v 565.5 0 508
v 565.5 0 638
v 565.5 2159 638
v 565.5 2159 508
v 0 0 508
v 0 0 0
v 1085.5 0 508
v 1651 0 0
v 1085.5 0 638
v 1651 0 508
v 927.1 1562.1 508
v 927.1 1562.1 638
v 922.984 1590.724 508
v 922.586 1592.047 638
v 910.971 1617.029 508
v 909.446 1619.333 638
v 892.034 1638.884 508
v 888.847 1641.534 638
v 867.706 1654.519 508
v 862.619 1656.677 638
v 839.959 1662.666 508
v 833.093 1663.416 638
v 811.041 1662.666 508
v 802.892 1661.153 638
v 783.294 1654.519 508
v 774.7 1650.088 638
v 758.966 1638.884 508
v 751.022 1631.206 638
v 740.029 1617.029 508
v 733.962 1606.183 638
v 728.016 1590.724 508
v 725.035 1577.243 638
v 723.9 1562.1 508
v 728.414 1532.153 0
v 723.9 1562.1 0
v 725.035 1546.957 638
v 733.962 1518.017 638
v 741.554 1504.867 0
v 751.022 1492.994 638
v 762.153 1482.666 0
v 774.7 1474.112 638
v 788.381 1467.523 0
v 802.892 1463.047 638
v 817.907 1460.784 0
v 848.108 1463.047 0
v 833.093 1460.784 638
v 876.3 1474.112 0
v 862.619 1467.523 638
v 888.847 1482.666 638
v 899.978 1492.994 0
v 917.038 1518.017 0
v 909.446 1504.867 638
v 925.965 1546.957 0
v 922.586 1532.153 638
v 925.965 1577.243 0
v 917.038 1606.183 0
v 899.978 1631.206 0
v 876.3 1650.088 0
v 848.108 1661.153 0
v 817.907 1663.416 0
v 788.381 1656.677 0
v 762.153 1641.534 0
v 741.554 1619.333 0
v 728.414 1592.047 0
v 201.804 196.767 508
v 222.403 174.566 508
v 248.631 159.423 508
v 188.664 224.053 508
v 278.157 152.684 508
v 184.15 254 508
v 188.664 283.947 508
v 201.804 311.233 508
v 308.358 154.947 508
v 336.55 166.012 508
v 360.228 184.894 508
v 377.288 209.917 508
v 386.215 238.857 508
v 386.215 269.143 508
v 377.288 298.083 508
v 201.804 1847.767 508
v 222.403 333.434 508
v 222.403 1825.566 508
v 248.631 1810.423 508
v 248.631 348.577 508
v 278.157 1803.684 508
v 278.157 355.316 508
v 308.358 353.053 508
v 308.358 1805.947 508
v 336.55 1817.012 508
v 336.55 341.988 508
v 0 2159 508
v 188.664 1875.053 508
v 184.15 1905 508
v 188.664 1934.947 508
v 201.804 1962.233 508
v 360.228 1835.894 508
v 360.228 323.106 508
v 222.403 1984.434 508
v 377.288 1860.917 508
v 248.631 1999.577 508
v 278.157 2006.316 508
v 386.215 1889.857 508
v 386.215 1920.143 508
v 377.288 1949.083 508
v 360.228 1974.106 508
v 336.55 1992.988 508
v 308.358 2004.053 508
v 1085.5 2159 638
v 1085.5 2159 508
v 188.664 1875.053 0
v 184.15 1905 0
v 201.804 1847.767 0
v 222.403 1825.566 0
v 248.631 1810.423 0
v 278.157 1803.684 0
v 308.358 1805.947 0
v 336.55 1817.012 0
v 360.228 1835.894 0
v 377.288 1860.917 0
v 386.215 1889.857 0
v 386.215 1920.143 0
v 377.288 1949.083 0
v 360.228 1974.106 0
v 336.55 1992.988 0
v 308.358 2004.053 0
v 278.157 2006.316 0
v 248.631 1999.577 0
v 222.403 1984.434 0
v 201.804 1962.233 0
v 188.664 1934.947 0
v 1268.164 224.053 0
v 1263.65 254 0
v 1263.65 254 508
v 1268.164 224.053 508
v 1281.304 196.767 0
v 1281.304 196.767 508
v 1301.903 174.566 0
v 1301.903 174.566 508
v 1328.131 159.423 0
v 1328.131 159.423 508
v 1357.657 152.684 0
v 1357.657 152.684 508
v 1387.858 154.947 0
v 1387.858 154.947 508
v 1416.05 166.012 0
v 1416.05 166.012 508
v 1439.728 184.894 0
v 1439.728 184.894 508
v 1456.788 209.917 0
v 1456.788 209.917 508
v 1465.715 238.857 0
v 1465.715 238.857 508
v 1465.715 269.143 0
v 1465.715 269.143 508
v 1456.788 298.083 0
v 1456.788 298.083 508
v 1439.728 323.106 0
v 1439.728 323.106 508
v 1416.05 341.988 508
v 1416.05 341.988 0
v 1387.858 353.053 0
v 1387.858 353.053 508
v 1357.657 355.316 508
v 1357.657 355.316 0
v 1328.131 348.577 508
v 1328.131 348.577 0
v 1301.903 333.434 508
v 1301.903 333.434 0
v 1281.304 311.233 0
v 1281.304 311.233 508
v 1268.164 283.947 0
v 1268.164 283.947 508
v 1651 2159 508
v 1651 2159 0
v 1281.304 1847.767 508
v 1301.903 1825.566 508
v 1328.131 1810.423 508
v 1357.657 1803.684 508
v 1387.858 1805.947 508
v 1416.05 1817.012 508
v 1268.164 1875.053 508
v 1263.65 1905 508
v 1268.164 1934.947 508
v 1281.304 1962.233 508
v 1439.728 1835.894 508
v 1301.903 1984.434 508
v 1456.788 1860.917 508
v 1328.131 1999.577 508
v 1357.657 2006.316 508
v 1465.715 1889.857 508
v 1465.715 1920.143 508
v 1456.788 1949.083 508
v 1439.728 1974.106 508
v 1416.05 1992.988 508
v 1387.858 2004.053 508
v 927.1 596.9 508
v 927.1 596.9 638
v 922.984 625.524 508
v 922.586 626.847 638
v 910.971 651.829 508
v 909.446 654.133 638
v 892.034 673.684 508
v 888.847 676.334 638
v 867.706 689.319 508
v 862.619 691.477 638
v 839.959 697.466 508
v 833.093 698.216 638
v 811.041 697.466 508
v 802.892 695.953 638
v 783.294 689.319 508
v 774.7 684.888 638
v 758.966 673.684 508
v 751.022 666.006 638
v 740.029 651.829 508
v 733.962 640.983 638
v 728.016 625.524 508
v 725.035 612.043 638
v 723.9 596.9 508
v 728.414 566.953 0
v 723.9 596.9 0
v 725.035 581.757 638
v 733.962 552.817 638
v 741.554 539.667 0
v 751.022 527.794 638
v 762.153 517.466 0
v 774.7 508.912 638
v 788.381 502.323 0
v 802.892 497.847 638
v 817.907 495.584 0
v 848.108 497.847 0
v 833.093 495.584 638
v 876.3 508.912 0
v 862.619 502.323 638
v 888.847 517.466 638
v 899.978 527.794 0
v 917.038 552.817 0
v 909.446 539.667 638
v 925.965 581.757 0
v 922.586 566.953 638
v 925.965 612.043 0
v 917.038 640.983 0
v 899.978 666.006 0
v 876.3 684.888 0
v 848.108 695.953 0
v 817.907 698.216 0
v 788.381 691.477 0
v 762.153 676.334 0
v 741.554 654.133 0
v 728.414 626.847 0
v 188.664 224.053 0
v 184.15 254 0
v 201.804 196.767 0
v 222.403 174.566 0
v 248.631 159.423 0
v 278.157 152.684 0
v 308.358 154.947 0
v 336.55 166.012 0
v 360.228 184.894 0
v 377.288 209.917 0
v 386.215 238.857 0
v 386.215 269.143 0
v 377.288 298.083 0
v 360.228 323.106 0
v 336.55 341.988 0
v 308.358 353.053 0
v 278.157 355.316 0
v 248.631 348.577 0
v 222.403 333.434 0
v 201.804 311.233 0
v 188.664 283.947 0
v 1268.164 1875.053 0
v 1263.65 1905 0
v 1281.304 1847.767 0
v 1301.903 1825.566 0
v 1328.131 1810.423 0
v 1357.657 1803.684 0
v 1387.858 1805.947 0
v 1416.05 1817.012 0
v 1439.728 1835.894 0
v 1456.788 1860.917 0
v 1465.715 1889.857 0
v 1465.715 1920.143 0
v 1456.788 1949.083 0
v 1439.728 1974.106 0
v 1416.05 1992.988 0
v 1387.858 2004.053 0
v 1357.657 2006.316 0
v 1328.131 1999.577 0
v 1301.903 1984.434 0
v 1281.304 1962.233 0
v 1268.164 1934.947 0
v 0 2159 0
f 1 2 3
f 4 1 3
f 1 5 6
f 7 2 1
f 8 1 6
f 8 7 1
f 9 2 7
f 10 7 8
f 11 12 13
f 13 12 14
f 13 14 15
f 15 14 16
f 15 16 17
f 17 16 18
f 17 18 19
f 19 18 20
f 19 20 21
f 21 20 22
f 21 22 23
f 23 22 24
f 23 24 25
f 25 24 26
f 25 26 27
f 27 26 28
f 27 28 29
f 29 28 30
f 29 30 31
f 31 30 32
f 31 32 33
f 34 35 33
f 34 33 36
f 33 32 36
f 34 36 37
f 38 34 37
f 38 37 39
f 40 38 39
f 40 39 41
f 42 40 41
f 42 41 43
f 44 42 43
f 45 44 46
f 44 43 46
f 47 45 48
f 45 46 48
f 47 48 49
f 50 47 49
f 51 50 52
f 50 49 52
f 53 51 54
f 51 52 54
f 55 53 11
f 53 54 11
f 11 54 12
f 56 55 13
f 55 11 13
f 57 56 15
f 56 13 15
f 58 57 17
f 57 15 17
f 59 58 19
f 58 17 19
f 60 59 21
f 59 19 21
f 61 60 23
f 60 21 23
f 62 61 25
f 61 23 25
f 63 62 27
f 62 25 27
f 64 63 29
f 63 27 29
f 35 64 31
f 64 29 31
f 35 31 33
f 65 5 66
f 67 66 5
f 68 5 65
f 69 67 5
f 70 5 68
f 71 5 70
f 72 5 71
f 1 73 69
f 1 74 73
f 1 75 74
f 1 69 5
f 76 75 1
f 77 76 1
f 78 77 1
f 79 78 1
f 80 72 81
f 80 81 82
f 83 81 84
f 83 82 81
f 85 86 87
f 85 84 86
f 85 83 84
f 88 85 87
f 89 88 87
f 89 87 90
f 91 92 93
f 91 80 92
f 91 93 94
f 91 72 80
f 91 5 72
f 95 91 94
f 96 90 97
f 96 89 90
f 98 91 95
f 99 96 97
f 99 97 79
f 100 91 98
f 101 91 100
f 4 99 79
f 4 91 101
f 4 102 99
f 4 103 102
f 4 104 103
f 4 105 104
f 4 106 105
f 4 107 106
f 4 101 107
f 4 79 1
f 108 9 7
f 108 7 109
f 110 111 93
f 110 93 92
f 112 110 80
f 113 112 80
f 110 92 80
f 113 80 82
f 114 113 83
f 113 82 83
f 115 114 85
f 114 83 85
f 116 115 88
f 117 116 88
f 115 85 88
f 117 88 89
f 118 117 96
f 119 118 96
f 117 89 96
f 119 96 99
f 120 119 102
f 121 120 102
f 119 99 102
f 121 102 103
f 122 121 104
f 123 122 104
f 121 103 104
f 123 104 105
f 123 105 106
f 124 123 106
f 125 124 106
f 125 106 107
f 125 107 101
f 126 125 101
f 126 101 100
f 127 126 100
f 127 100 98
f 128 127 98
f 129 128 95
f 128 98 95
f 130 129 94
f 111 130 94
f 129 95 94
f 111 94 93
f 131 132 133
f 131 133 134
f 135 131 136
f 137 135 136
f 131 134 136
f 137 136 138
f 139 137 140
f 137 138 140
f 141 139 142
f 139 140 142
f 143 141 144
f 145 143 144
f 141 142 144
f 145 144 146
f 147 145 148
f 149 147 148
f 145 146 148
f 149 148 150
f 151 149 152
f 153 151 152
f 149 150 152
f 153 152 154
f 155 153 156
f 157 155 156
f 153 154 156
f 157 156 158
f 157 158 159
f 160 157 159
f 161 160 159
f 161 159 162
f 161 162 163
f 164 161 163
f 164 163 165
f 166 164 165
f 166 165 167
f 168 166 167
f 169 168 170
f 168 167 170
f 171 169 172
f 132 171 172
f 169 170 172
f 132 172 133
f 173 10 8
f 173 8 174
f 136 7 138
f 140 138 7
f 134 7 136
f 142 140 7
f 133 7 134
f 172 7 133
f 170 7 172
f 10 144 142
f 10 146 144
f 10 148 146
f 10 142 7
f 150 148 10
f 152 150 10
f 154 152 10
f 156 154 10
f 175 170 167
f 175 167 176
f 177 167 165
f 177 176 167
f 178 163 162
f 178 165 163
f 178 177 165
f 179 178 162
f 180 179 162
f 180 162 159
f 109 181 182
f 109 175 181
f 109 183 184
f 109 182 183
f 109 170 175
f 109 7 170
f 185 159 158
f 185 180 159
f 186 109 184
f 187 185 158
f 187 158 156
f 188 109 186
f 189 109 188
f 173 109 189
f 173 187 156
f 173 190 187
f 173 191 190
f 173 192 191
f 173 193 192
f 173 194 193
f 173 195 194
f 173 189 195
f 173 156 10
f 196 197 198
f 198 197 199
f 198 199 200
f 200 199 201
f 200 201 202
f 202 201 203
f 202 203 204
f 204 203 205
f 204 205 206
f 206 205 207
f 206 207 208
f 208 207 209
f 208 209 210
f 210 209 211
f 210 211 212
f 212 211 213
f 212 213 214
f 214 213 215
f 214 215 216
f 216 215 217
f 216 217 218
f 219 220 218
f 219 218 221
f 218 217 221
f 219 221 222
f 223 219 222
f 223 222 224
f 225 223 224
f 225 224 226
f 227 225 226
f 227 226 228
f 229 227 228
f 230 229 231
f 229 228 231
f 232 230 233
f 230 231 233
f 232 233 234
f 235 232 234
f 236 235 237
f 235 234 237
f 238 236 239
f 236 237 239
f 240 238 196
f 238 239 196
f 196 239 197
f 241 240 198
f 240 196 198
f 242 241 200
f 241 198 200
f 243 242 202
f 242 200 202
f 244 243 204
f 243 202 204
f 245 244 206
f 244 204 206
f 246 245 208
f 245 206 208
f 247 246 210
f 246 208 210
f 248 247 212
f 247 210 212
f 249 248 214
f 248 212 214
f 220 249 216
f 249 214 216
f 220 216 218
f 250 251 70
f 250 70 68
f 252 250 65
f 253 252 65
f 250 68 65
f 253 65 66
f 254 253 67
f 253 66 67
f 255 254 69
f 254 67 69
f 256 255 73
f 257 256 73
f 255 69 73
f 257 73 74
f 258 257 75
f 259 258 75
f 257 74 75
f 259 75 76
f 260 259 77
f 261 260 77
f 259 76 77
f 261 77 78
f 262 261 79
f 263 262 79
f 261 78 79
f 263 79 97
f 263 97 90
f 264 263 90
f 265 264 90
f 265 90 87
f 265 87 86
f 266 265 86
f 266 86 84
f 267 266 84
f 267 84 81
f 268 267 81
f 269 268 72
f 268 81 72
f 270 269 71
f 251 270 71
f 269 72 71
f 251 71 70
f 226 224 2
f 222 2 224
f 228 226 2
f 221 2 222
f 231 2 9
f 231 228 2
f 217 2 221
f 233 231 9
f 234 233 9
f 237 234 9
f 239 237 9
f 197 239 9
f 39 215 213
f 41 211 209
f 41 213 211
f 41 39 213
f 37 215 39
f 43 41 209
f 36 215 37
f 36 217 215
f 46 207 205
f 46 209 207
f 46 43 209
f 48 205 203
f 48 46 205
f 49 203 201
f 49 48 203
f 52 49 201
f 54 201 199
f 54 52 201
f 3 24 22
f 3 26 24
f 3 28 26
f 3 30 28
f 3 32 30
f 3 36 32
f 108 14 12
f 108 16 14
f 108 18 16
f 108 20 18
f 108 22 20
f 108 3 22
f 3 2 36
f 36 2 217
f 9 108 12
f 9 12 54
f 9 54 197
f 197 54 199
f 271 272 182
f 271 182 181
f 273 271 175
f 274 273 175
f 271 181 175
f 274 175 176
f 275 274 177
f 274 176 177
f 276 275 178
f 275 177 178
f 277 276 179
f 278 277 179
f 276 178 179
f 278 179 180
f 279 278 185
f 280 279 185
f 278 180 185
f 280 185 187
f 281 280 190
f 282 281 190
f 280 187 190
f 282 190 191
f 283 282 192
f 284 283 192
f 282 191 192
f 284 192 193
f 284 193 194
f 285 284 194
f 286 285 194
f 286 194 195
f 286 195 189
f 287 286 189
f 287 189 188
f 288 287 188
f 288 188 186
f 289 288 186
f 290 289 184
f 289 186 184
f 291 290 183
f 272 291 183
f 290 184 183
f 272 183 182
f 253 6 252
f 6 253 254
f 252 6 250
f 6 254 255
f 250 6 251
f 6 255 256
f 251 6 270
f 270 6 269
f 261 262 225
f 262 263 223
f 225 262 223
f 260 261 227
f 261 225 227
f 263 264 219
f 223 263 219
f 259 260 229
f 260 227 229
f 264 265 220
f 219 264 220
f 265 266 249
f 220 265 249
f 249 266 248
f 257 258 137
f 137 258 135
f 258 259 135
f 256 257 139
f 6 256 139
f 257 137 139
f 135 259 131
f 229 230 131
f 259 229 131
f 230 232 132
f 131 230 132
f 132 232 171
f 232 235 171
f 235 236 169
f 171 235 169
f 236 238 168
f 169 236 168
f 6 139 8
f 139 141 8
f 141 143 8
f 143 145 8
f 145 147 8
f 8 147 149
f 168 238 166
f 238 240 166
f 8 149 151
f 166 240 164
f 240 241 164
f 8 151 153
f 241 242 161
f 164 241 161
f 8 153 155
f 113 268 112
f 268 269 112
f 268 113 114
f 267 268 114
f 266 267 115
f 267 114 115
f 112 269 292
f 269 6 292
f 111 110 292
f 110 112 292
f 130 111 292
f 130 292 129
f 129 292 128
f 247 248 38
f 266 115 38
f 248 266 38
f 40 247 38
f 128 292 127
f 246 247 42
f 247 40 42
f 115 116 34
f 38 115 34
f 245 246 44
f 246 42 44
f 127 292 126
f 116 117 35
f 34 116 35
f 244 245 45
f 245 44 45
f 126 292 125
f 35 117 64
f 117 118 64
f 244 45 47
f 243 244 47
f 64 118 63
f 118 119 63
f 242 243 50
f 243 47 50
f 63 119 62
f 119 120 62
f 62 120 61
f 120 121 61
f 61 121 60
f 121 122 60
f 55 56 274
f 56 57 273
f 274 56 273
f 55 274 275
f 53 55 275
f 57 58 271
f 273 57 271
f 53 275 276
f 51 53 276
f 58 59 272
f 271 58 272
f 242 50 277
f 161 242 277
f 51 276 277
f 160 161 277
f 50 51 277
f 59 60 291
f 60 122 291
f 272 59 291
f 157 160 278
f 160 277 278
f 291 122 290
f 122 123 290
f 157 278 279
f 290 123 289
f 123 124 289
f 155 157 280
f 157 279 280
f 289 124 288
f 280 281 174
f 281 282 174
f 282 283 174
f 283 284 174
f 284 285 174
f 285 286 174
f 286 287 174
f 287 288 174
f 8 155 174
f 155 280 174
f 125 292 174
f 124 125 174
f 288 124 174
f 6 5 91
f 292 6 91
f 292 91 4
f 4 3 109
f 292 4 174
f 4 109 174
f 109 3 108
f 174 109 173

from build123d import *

# Parameters (mm, degrees)
SKETCH1_W           = 1651
SKETCH1_H           = 2159
SKETCH1_R           = 101.6
BOSS_EXTRUDE1_DEPTH = 508
BOSS_EXTRUDE2_START = 130
SKETCH2_W           = 520
SKETCH2_H           = 2159
SKETCH2_R           = 101.6
BOSS_EXTRUDE2_DEPTH = 130


with BuildPart() as part:
    # Sketch1 → Boss-Extrude1 (new body)
    with BuildSketch(Plane.XY.offset(508)):
        with Locations((825.5, 1079.5)):
            Rectangle(SKETCH1_W, SKETCH1_H)
        with Locations(Location((285.75, 254, 0), (0, 0, 180))):
            Circle(SKETCH1_R, mode=Mode.SUBTRACT)
        with Locations(Location((1365.25, 1905, 0), (0, 0, 180))):
            Circle(SKETCH1_R, mode=Mode.SUBTRACT)
        with Locations(Location((825.5, 1562.1, 0), (0, 0, 180))):
            Circle(SKETCH1_R, mode=Mode.SUBTRACT)
        with Locations(Location((285.75, 1905, 0), (0, 0, 180))):
            Circle(SKETCH1_R, mode=Mode.SUBTRACT)
        with Locations(Location((1365.25, 254, 0), (0, 0, 180))):
            Circle(SKETCH1_R, mode=Mode.SUBTRACT)
        with Locations(Location((825.5, 596.9, 0), (0, 0, 180))):
            Circle(SKETCH1_R, mode=Mode.SUBTRACT)
    extrude(amount=-BOSS_EXTRUDE1_DEPTH)

    # Sketch2 → Boss-Extrude2 (add)
    with BuildSketch(Plane.XY.offset(508).offset(BOSS_EXTRUDE2_START)):
        with Locations((825.5, 1079.5)):
            Rectangle(SKETCH2_W, SKETCH2_H)
        with Locations((825.5, 596.9)):
            Circle(SKETCH2_R, mode=Mode.SUBTRACT)
        with Locations((825.5, 1562.1)):
            Circle(SKETCH2_R, mode=Mode.SUBTRACT)
    extrude(amount=-BOSS_EXTRUDE2_DEPTH)


solid = part.part
